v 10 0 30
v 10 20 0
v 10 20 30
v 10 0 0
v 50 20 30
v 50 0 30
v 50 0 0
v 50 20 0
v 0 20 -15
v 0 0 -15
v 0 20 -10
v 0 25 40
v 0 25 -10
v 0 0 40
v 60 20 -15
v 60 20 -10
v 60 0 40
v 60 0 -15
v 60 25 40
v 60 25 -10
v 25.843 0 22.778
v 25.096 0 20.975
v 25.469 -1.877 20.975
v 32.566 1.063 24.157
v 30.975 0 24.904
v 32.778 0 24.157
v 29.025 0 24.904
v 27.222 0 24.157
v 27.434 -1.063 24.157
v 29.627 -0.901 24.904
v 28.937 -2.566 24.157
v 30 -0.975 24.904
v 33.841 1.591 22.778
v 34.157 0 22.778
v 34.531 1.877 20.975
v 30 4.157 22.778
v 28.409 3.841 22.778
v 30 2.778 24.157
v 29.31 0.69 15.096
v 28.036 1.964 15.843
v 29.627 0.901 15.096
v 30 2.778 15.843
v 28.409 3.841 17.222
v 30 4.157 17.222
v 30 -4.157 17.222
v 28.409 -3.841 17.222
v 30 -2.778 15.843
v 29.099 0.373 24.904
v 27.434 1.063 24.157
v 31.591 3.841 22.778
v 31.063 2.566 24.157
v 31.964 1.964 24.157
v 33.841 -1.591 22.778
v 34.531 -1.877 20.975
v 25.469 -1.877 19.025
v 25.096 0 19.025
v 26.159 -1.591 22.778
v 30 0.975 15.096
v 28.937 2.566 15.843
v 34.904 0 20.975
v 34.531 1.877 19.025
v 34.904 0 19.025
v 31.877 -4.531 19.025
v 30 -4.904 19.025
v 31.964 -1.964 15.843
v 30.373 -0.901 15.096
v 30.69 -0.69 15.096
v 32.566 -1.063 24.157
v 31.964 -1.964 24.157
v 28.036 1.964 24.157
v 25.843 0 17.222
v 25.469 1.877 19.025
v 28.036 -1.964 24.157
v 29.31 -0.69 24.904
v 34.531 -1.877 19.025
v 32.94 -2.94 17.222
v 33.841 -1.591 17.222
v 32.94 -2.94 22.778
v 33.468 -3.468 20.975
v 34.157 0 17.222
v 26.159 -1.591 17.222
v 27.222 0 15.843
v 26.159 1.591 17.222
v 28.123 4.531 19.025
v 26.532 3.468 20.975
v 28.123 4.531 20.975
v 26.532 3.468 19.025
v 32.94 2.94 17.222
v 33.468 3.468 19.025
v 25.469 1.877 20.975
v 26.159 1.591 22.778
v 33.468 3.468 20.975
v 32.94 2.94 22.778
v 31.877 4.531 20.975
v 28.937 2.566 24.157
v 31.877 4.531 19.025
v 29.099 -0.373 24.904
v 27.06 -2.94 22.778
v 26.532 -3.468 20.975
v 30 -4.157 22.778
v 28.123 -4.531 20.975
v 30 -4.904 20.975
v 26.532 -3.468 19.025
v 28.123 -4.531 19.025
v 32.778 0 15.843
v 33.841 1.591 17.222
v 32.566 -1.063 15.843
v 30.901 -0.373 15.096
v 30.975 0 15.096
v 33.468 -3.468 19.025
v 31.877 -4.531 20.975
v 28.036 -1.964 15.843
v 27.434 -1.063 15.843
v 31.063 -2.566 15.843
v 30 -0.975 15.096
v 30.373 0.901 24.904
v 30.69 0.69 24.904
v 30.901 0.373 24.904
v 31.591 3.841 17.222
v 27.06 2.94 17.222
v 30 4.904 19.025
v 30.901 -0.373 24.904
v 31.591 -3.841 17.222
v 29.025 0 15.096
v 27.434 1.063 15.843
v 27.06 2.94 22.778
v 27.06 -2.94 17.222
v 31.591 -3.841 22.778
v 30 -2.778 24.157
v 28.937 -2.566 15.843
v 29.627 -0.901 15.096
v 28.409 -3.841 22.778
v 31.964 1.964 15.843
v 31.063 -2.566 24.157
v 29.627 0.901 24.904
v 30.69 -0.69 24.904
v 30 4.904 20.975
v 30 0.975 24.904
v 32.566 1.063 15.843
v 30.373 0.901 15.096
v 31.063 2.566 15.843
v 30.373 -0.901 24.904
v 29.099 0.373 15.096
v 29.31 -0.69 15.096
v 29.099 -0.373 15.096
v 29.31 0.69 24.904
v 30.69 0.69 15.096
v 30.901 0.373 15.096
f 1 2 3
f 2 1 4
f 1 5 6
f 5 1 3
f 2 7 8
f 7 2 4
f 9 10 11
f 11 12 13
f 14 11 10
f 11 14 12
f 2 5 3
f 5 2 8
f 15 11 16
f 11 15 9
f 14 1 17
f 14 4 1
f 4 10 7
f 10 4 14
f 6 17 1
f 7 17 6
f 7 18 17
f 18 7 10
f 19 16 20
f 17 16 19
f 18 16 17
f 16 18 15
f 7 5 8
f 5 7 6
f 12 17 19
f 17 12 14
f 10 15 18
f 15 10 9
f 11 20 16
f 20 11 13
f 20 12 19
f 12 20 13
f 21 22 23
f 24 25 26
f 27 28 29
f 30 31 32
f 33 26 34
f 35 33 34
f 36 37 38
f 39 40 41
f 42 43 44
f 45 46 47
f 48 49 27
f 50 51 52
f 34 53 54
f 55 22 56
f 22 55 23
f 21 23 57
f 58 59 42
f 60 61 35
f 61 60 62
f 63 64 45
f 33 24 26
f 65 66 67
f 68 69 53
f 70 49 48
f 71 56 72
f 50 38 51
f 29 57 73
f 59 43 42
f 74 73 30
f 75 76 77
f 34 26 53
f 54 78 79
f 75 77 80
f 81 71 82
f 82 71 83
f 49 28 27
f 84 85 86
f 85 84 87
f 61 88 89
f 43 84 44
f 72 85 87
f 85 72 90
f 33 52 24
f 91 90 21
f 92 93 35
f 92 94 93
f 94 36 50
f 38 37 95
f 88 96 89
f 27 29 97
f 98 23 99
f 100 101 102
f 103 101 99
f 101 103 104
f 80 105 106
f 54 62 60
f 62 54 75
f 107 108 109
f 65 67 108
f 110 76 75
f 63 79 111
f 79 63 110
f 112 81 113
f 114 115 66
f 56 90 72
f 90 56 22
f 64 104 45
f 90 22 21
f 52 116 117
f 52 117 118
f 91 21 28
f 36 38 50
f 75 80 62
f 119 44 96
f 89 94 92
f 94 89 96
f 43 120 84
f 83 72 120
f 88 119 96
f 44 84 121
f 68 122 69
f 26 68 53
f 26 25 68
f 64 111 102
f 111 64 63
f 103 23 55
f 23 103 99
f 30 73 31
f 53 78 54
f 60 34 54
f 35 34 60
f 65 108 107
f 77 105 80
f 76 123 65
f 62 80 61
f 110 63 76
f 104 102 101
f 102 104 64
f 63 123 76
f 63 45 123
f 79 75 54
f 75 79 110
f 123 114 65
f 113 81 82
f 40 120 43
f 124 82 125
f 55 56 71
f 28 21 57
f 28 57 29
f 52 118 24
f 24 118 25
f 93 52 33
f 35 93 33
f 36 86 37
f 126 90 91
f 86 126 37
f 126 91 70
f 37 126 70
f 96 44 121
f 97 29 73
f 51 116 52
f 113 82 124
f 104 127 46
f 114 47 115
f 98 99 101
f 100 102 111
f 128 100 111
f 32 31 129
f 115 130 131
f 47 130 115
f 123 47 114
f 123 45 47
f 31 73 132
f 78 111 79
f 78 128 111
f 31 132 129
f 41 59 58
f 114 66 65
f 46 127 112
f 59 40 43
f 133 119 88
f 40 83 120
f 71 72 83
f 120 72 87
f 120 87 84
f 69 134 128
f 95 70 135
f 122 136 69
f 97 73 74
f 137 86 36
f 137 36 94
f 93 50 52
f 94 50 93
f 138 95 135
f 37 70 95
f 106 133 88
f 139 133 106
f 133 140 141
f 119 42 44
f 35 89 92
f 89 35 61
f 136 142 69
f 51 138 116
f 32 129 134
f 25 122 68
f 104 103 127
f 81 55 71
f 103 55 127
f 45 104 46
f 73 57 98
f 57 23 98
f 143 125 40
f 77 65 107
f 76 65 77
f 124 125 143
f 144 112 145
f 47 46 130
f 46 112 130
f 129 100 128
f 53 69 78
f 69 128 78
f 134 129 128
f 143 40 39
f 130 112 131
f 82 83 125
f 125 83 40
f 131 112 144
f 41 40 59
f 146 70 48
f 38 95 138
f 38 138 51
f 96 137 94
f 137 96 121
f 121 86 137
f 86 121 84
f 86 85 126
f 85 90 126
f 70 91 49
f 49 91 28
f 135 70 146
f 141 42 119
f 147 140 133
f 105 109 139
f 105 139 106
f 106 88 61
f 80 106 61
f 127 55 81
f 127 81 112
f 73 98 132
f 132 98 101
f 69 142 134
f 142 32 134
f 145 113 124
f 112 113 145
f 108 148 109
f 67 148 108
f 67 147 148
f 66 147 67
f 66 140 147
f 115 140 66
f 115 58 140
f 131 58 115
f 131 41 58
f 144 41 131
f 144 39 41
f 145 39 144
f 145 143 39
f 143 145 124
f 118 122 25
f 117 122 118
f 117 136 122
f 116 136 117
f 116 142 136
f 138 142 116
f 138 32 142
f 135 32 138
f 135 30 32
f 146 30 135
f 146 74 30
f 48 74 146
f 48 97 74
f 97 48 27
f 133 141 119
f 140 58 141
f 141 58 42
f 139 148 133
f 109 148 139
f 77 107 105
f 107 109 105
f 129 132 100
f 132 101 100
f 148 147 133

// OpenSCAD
color([0.2,0.9,0.2,1])
cube([10,20,30]);
translate([50,0,0])
color([1,0,0,1])
cube([10,20,30]);
translate([0,0,30])
color([0,0,1,1])
cube([60,20,10]);
translate([0,0,-15])
color([1,0.71,0.76])
cube([60,20,15]);
translate([10,0,2])
color([1,1,1,1])
rotate([90,0,0])
text("YOLO", font="tohoma:style=bold");
color([0,0,0,1])
translate([0,20,-10])
cube([60,5,50]);
translate([30,0,20])
color([0.7,0.5,1,1])
sphere(5);

translate([0.5,0,-12])
color([1,1,1,1])
rotate([90,0,0])
text("BITCHEZ", font="tohoma:style=bold");
